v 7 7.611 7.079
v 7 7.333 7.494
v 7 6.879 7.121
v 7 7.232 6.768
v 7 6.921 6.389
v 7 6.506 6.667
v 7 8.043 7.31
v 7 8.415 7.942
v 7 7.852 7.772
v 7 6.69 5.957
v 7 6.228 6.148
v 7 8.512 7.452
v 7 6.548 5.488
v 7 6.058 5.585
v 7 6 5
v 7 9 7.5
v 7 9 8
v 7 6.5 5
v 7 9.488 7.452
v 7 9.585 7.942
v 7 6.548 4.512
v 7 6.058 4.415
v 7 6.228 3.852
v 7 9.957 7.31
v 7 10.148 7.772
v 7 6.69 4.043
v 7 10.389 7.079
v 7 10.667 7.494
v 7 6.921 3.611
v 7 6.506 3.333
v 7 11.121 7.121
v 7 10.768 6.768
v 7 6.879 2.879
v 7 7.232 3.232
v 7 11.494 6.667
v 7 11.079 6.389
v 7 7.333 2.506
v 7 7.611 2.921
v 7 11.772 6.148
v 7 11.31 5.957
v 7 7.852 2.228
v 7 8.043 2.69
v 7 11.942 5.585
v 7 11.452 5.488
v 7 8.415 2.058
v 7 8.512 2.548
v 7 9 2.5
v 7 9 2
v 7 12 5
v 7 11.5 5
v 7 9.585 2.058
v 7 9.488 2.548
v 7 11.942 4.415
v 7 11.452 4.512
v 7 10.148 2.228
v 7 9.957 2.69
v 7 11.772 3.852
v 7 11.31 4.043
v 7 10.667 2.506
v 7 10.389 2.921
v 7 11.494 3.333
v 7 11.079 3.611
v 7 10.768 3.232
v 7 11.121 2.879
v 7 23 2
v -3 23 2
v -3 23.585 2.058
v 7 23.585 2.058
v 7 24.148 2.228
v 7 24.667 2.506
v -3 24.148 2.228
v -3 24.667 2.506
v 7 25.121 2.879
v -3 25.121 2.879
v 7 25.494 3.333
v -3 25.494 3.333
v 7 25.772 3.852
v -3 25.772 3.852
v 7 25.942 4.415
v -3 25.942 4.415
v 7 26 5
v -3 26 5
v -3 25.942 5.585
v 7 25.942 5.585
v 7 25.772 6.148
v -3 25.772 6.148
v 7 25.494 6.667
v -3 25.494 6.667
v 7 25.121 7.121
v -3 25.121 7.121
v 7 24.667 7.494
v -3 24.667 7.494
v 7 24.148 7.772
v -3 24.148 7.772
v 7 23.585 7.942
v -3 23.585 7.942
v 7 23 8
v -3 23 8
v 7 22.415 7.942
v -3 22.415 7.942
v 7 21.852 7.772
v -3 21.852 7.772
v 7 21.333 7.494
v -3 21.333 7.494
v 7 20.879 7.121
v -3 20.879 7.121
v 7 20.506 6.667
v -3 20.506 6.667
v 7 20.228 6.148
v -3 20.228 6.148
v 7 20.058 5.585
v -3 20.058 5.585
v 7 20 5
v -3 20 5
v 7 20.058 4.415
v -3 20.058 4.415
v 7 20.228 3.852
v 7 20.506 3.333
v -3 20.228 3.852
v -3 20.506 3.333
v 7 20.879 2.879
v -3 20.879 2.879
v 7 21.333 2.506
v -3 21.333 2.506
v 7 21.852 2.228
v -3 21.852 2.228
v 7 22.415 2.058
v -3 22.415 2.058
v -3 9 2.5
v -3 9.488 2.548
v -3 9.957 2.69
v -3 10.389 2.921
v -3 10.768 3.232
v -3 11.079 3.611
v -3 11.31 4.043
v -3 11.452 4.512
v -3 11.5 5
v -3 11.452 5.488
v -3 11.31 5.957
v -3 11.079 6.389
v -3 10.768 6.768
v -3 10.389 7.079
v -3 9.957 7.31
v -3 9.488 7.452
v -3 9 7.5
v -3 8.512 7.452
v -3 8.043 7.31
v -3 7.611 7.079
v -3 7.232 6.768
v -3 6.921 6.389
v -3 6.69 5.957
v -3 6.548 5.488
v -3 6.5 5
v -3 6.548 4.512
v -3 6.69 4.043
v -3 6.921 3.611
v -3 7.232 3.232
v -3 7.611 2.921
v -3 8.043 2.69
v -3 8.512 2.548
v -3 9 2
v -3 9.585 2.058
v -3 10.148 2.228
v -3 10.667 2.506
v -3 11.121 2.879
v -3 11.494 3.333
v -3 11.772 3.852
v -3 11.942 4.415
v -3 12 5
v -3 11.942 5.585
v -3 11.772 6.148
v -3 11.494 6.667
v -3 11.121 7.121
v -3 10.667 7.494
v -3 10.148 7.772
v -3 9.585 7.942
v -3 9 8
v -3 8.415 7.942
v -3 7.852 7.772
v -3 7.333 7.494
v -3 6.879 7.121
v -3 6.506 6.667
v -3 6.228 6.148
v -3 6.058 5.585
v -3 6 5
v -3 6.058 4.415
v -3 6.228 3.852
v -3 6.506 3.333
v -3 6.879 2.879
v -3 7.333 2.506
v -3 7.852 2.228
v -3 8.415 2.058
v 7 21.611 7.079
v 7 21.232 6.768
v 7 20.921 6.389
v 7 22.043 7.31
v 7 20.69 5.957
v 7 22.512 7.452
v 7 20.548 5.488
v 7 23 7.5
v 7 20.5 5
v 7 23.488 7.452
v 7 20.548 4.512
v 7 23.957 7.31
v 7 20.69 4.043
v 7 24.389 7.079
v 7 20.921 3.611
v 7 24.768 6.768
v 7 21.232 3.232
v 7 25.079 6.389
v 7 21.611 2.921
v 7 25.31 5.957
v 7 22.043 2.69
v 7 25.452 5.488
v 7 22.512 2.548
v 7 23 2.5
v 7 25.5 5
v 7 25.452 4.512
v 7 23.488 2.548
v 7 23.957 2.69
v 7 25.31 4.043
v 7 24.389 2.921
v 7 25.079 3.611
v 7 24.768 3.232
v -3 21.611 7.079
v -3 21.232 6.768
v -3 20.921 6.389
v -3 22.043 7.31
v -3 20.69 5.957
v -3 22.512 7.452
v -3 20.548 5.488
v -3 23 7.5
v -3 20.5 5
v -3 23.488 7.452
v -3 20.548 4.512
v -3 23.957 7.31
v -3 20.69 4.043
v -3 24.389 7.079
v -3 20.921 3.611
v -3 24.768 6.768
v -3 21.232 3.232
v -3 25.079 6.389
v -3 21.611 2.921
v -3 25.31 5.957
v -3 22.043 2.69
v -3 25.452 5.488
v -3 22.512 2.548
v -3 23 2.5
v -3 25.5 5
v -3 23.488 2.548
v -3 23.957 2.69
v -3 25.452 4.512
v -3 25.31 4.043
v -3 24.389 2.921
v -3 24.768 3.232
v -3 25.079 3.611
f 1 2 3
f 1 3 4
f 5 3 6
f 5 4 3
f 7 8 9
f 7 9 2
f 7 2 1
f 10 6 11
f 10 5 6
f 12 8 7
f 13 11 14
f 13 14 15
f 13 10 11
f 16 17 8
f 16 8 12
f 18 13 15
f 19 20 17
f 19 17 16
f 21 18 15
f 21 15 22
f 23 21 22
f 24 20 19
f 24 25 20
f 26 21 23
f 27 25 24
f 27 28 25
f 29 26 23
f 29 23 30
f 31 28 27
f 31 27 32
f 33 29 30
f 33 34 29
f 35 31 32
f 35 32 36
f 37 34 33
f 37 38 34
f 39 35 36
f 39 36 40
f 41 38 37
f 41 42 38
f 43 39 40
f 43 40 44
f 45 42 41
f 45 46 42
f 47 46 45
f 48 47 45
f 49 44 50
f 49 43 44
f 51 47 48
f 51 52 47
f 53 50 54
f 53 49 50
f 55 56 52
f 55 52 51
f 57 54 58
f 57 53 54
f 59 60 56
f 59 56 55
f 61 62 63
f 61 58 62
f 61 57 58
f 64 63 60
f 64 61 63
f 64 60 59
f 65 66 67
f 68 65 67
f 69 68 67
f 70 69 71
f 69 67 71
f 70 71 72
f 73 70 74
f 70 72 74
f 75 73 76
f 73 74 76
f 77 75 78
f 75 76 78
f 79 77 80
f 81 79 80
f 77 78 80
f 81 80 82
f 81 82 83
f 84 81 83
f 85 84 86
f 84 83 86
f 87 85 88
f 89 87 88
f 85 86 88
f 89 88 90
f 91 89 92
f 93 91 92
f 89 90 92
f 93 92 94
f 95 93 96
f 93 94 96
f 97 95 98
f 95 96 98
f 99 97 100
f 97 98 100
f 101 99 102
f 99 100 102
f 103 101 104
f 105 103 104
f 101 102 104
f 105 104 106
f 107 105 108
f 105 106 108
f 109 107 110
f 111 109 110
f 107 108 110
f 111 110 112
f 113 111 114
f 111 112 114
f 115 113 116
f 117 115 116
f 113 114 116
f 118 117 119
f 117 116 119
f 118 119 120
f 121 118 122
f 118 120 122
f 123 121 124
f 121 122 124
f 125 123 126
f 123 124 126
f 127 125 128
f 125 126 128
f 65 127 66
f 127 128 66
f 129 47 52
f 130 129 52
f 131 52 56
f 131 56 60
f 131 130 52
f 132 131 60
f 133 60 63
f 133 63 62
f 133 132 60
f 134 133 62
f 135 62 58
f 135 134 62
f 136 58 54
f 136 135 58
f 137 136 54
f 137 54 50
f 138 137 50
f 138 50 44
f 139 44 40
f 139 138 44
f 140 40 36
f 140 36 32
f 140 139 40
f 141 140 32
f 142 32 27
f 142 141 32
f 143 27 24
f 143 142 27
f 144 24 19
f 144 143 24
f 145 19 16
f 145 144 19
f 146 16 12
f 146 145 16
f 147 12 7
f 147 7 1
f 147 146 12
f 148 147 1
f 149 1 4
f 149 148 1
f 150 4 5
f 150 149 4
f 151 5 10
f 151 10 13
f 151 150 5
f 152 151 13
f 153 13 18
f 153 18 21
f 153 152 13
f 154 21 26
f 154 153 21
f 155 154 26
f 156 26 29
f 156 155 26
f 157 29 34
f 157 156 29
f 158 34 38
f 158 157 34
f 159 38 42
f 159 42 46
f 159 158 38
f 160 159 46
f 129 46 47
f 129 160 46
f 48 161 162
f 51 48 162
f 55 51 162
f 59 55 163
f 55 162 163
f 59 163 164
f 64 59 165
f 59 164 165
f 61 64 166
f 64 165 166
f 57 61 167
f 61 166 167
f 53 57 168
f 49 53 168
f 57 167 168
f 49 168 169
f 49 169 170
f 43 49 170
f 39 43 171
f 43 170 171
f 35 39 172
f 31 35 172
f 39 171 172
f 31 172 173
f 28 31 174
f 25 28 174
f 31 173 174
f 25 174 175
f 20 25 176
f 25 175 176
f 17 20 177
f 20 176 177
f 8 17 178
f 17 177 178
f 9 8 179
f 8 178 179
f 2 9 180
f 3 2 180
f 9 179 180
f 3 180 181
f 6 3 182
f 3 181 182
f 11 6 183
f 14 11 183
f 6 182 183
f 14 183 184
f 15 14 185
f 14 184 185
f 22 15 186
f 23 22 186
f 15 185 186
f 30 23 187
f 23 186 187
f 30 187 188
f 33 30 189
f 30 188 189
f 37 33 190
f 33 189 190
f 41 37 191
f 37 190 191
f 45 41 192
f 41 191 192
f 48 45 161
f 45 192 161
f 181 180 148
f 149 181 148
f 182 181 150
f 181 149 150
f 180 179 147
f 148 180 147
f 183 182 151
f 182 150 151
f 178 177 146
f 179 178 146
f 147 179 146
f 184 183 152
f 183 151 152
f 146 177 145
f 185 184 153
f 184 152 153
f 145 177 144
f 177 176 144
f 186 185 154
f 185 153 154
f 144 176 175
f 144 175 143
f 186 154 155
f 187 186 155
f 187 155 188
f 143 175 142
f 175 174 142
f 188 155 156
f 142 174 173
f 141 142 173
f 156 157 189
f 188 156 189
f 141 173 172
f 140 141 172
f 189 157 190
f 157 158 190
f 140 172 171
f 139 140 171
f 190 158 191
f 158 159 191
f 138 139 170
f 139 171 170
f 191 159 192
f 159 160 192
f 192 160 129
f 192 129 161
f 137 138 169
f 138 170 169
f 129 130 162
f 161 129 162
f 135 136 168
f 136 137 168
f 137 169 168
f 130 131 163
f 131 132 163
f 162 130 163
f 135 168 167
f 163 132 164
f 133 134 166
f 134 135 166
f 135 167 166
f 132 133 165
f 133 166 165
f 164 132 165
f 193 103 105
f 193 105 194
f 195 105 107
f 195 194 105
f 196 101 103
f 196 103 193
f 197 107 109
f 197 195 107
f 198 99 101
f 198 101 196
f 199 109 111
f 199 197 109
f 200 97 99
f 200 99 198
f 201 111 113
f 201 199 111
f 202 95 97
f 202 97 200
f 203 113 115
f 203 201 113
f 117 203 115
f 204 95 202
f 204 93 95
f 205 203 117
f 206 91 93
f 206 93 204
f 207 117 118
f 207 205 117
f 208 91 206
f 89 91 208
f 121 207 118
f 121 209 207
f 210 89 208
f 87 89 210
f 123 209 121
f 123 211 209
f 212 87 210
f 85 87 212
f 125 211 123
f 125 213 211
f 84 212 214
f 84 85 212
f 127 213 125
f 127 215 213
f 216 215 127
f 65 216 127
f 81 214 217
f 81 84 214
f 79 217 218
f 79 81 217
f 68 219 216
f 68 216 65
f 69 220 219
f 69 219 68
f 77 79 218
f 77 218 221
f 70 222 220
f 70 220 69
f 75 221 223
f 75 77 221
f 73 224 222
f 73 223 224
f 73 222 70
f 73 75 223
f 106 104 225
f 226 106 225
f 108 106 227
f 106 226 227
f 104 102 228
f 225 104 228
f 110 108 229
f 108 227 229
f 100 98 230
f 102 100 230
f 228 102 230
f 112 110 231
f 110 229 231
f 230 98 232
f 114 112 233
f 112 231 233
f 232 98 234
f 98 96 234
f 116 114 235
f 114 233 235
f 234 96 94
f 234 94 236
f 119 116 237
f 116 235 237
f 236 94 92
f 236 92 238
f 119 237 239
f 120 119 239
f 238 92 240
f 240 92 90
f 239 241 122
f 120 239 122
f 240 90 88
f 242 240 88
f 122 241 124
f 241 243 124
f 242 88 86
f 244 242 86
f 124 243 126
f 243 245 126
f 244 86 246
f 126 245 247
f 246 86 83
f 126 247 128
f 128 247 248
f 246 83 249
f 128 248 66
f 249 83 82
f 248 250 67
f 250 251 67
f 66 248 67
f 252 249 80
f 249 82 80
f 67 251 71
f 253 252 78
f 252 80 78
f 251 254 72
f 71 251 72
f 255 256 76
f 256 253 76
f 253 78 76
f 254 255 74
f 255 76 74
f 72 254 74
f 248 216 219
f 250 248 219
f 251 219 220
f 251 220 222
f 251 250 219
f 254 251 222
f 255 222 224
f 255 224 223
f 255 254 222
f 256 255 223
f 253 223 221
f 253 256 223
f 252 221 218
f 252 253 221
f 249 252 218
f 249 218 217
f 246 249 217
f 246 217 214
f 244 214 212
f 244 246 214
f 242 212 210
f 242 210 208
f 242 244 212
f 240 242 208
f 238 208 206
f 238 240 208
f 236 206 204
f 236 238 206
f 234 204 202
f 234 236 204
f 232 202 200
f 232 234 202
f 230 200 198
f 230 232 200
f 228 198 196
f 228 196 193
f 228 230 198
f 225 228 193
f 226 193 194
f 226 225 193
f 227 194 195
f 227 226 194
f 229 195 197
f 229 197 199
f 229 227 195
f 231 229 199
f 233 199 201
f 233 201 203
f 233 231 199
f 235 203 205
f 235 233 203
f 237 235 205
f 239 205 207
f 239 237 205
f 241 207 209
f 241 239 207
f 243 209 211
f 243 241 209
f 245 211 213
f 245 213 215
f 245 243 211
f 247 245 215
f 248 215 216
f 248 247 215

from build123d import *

# Parameters (mm, degrees)
CYLINDER_R              = 2.5
CYLINDER_DEPTH          = 10
CYLINDER_PITCH_ANGLE    = 90
CYLINDER002_R           = 3
CYLINDER002_DEPTH       = 10
CYLINDER002_PITCH_ANGLE = 90
CYLINDER001_R           = 2.5
CYLINDER001_DEPTH       = 10
CYLINDER001_PITCH_ANGLE = 90
CYLINDER003_R           = 3
CYLINDER003_DEPTH       = 10
CYLINDER003_PITCH_ANGLE = 90


with BuildPart() as cilindro:
    # Cylinder → Cylinder (new body)
    with BuildSketch(Plane.XY):
        Circle(CYLINDER_R)
    extrude(amount=CYLINDER_DEPTH)


with BuildPart() as cilindro_1:
    # Cylinder pitch: moved
    add(cilindro.part.rotate(Axis((0, 0, 0), (0, 1, 0)), CYLINDER_PITCH_ANGLE))


with BuildPart() as cilindro_2:
    # Cylinder placement: moved
    add(cilindro_1.part.moved(Location((-3, 9, 5))))


with BuildPart() as cut001:
    # Cylinder002 → Cylinder002 (new body)
    with BuildSketch(Plane.XY):
        Circle(CYLINDER002_R)
    extrude(amount=CYLINDER002_DEPTH)


with BuildPart() as cut001_1:
    # Cylinder002 pitch: moved
    add(cut001.part.rotate(Axis((0, 0, 0), (0, 1, 0)), CYLINDER002_PITCH_ANGLE))


with BuildPart() as cut001_2:
    # Cylinder002 placement: moved
    add(cut001_1.part.moved(Location((-3, 9, 5))))

    # Cut001: cut Cilindro
    add(cilindro_2.part, mode=Mode.SUBTRACT)


with BuildPart() as cilindro001:
    # Cylinder001 → Cylinder001 (new body)
    with BuildSketch(Plane.XY):
        Circle(CYLINDER001_R)
    extrude(amount=CYLINDER001_DEPTH)


with BuildPart() as cilindro001_1:
    # Cylinder001 pitch: moved
    add(cilindro001.part.rotate(Axis((0, 0, 0), (0, 1, 0)), CYLINDER001_PITCH_ANGLE))


with BuildPart() as cilindro001_2:
    # Cylinder001 placement: moved
    add(cilindro001_1.part.moved(Location((-3, 23, 5))))


with BuildPart() as jacks:
    # Cylinder003 → Cylinder003 (new body)
    with BuildSketch(Plane.XY):
        Circle(CYLINDER003_R)
    extrude(amount=CYLINDER003_DEPTH)


with BuildPart() as jacks_1:
    # Cylinder003 pitch: moved
    add(jacks.part.rotate(Axis((0, 0, 0), (0, 1, 0)), CYLINDER003_PITCH_ANGLE))


with BuildPart() as jacks_2:
    # Cylinder003 placement: moved
    add(jacks_1.part.moved(Location((-3, 23, 5))))

    # Cut: cut Cilindro001
    add(cilindro001_2.part, mode=Mode.SUBTRACT)

    # Fusion001: union Cut001
    add(cut001_2.part)


solid = jacks_2.part
